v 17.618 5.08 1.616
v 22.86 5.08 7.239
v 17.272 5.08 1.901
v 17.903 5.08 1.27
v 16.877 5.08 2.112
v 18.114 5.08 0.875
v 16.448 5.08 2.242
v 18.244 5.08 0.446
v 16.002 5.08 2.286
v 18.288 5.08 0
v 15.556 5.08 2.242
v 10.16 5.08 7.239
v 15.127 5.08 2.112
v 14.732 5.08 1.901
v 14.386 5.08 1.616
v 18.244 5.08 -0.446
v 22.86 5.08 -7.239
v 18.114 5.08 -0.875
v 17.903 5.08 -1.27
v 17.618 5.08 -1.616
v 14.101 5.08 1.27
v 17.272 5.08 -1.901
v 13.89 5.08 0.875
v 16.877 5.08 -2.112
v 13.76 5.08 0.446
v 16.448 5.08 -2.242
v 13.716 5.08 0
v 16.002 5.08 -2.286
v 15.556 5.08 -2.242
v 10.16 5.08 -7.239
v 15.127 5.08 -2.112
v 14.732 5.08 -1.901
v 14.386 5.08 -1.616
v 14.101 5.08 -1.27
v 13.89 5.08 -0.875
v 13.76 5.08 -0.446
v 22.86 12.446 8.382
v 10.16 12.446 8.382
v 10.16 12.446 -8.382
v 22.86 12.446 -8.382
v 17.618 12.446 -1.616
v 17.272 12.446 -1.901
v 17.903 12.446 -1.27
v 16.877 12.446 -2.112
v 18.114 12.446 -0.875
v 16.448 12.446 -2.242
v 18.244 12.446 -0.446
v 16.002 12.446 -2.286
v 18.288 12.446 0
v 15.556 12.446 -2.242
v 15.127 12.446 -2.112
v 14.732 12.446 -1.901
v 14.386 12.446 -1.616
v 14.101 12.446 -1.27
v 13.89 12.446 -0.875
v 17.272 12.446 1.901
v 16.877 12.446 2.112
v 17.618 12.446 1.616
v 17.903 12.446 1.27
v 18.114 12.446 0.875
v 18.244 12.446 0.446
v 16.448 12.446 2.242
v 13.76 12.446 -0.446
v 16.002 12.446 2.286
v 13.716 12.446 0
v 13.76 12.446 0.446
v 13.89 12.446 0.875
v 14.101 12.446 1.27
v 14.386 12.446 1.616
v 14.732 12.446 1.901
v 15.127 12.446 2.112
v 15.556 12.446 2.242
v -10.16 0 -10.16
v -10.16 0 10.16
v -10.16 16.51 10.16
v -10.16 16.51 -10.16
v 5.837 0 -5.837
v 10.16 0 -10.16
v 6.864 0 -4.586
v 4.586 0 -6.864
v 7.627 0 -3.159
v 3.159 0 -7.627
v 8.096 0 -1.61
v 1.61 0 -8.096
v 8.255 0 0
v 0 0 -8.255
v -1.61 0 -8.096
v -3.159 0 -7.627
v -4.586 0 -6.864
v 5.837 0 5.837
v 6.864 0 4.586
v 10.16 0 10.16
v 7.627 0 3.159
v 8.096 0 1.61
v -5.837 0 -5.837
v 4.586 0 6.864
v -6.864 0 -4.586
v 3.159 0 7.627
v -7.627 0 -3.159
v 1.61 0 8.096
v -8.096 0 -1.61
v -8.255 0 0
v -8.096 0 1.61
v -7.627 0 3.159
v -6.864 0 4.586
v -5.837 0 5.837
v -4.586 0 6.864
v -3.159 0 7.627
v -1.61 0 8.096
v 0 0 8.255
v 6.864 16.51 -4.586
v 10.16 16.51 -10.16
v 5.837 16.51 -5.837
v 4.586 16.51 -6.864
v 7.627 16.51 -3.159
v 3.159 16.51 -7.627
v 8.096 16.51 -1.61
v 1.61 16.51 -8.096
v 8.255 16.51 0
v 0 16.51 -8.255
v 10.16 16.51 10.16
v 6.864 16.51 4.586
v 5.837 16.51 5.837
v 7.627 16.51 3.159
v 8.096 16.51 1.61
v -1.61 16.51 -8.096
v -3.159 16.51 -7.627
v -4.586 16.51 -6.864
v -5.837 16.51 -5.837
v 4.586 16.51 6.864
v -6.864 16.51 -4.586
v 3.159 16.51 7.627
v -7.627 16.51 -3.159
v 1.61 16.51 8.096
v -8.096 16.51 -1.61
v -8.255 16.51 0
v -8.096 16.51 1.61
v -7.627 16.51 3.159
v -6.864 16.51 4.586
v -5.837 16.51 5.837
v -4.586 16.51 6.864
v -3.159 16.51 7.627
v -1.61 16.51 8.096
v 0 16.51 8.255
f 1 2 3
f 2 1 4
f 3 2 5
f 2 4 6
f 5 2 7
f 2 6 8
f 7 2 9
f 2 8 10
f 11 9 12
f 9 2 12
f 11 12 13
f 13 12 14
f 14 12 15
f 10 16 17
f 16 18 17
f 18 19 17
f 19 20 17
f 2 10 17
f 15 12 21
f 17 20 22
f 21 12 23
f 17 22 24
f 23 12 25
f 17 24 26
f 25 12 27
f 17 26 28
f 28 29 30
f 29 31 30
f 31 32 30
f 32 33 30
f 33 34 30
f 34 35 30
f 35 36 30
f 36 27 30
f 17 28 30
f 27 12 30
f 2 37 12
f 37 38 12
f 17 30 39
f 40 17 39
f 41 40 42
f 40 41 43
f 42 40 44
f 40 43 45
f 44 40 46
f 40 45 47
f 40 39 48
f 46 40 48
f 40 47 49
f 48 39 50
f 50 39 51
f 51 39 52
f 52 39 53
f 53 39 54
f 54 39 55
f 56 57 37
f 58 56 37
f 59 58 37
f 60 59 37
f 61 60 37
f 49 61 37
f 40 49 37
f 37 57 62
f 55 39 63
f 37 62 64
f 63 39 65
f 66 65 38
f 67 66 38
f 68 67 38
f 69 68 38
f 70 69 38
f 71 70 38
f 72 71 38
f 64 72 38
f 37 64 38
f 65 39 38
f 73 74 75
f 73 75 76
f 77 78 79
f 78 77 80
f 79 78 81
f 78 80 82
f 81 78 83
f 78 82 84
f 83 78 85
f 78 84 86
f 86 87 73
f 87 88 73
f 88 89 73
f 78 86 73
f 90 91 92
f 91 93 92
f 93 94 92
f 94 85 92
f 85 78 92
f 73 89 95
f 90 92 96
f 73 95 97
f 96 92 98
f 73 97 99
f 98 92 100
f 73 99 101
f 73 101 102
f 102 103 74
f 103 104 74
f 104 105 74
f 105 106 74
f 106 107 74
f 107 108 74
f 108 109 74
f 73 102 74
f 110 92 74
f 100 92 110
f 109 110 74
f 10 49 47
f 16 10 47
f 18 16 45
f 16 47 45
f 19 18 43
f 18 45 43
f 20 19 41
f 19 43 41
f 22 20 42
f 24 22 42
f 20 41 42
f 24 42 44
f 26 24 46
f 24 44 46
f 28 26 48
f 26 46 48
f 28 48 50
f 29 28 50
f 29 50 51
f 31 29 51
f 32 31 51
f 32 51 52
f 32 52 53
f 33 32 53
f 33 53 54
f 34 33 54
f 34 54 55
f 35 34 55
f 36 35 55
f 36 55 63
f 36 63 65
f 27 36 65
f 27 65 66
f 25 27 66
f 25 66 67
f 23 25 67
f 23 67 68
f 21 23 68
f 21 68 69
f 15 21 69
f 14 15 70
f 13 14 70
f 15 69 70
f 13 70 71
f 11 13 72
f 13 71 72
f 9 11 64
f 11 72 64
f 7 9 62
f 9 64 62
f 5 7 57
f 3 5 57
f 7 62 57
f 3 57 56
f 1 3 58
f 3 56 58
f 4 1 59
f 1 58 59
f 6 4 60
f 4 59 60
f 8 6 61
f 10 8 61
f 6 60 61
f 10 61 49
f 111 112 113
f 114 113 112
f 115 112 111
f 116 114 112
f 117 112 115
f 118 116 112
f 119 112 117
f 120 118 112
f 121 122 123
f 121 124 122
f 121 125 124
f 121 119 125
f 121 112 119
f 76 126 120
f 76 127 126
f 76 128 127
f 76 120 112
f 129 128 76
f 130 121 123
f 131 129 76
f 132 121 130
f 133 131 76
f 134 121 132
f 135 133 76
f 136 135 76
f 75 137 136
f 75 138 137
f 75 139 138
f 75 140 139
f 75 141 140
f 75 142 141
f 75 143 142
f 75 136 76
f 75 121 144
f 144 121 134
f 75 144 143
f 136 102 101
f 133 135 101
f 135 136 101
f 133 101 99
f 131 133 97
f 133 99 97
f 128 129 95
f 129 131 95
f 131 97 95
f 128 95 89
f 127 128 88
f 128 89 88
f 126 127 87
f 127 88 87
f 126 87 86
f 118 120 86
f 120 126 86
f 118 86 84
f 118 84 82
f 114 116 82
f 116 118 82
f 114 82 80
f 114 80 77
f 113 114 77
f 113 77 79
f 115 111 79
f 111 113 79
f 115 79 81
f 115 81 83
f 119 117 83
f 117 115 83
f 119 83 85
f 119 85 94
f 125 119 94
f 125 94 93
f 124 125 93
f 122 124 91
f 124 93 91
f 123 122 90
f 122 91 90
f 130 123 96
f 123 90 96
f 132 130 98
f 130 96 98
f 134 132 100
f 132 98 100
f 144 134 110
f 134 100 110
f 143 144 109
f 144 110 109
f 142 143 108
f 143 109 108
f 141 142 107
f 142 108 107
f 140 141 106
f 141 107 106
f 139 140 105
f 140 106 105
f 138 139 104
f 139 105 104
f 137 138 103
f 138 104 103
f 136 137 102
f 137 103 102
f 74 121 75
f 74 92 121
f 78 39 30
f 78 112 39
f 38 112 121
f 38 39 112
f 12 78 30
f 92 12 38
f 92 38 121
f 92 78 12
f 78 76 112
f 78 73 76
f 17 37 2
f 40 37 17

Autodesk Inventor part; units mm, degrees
ref_plane "YZ Plane" through (0, 0, 0) normal (1, 0, 0) x (0, 1, 0)
ref_plane "XZ Plane" through (0, 0, 0) normal (0, 1, 0) x (-1, 0, 0)
ref_plane "XY Plane" through (0, 0, 0) normal (0, 0, 1) x (1, 0, 0)
sketch "Sketch1" plane through (0, 0, 0) normal (0, 1, 0) x (-1, 0, 0)
  line L0 (-10.16, 10.16) -> (10.16, 10.16)
  line L1 (10.16, 10.16) -> (10.16, -10.16)
  line L2 (10.16, -10.16) -> (-10.16, -10.16)
  line L3 (-10.16, -10.16) -> (-10.16, 10.16)
  circle A0 centre (0, 0) radius 8.255
  dimension "d0" = 20.32
  dimension "d1" = 20.32
  dimension "d2" = 10.16
  dimension "d3" = 10.16
  dimension "d4" = 16.51
extrude "Extrusion1" add sketch "Sketch1" along normal blind 16.51
sketch "Sketch2" plane through (10.16, 0, 10.16) normal (1, 0, 0) x (0, 0, -1)
  line L0 (1.778, 12.446) -> (2.921, 5.08)
  line L1 (2.921, 5.08) -> (17.399, 5.08)
  line L2 (17.399, 5.08) -> (18.542, 12.446)
  line L3 (18.542, 12.446) -> (1.778, 12.446)
  line L4 (20.32, 0) -> (0, 0) projected
  line L5 (20.32, 0) -> (20.32, 16.51) projected
  point P0 (10.16, 0)
  dimension "d7" = 16.764
  dimension "d8" = 14.478
  dimension "d9" = 7.366
  dimension "d10" = 5.08
  dimension "d11" = 2.921
extrude "Extrusion2" add sketch "Sketch2" along normal blind 12.7
sketch "Sketch3" plane through (10.16, 12.446, 8.382) normal (0, 1, 0) x (1, 0, 0)
  circle A0 centre (5.842, 8.382) radius 2.286
  line L0 (12.7, 16.764) -> (12.7, 0) projected
  point P0 (-10.16, 8.382)
  dimension "d14" = 4.572
  dimension "d15" = 6.858
extrude "Extrusion3" cut sketch "Sketch3" against normal blind 17.78
properties part number "HopperFinal1"
